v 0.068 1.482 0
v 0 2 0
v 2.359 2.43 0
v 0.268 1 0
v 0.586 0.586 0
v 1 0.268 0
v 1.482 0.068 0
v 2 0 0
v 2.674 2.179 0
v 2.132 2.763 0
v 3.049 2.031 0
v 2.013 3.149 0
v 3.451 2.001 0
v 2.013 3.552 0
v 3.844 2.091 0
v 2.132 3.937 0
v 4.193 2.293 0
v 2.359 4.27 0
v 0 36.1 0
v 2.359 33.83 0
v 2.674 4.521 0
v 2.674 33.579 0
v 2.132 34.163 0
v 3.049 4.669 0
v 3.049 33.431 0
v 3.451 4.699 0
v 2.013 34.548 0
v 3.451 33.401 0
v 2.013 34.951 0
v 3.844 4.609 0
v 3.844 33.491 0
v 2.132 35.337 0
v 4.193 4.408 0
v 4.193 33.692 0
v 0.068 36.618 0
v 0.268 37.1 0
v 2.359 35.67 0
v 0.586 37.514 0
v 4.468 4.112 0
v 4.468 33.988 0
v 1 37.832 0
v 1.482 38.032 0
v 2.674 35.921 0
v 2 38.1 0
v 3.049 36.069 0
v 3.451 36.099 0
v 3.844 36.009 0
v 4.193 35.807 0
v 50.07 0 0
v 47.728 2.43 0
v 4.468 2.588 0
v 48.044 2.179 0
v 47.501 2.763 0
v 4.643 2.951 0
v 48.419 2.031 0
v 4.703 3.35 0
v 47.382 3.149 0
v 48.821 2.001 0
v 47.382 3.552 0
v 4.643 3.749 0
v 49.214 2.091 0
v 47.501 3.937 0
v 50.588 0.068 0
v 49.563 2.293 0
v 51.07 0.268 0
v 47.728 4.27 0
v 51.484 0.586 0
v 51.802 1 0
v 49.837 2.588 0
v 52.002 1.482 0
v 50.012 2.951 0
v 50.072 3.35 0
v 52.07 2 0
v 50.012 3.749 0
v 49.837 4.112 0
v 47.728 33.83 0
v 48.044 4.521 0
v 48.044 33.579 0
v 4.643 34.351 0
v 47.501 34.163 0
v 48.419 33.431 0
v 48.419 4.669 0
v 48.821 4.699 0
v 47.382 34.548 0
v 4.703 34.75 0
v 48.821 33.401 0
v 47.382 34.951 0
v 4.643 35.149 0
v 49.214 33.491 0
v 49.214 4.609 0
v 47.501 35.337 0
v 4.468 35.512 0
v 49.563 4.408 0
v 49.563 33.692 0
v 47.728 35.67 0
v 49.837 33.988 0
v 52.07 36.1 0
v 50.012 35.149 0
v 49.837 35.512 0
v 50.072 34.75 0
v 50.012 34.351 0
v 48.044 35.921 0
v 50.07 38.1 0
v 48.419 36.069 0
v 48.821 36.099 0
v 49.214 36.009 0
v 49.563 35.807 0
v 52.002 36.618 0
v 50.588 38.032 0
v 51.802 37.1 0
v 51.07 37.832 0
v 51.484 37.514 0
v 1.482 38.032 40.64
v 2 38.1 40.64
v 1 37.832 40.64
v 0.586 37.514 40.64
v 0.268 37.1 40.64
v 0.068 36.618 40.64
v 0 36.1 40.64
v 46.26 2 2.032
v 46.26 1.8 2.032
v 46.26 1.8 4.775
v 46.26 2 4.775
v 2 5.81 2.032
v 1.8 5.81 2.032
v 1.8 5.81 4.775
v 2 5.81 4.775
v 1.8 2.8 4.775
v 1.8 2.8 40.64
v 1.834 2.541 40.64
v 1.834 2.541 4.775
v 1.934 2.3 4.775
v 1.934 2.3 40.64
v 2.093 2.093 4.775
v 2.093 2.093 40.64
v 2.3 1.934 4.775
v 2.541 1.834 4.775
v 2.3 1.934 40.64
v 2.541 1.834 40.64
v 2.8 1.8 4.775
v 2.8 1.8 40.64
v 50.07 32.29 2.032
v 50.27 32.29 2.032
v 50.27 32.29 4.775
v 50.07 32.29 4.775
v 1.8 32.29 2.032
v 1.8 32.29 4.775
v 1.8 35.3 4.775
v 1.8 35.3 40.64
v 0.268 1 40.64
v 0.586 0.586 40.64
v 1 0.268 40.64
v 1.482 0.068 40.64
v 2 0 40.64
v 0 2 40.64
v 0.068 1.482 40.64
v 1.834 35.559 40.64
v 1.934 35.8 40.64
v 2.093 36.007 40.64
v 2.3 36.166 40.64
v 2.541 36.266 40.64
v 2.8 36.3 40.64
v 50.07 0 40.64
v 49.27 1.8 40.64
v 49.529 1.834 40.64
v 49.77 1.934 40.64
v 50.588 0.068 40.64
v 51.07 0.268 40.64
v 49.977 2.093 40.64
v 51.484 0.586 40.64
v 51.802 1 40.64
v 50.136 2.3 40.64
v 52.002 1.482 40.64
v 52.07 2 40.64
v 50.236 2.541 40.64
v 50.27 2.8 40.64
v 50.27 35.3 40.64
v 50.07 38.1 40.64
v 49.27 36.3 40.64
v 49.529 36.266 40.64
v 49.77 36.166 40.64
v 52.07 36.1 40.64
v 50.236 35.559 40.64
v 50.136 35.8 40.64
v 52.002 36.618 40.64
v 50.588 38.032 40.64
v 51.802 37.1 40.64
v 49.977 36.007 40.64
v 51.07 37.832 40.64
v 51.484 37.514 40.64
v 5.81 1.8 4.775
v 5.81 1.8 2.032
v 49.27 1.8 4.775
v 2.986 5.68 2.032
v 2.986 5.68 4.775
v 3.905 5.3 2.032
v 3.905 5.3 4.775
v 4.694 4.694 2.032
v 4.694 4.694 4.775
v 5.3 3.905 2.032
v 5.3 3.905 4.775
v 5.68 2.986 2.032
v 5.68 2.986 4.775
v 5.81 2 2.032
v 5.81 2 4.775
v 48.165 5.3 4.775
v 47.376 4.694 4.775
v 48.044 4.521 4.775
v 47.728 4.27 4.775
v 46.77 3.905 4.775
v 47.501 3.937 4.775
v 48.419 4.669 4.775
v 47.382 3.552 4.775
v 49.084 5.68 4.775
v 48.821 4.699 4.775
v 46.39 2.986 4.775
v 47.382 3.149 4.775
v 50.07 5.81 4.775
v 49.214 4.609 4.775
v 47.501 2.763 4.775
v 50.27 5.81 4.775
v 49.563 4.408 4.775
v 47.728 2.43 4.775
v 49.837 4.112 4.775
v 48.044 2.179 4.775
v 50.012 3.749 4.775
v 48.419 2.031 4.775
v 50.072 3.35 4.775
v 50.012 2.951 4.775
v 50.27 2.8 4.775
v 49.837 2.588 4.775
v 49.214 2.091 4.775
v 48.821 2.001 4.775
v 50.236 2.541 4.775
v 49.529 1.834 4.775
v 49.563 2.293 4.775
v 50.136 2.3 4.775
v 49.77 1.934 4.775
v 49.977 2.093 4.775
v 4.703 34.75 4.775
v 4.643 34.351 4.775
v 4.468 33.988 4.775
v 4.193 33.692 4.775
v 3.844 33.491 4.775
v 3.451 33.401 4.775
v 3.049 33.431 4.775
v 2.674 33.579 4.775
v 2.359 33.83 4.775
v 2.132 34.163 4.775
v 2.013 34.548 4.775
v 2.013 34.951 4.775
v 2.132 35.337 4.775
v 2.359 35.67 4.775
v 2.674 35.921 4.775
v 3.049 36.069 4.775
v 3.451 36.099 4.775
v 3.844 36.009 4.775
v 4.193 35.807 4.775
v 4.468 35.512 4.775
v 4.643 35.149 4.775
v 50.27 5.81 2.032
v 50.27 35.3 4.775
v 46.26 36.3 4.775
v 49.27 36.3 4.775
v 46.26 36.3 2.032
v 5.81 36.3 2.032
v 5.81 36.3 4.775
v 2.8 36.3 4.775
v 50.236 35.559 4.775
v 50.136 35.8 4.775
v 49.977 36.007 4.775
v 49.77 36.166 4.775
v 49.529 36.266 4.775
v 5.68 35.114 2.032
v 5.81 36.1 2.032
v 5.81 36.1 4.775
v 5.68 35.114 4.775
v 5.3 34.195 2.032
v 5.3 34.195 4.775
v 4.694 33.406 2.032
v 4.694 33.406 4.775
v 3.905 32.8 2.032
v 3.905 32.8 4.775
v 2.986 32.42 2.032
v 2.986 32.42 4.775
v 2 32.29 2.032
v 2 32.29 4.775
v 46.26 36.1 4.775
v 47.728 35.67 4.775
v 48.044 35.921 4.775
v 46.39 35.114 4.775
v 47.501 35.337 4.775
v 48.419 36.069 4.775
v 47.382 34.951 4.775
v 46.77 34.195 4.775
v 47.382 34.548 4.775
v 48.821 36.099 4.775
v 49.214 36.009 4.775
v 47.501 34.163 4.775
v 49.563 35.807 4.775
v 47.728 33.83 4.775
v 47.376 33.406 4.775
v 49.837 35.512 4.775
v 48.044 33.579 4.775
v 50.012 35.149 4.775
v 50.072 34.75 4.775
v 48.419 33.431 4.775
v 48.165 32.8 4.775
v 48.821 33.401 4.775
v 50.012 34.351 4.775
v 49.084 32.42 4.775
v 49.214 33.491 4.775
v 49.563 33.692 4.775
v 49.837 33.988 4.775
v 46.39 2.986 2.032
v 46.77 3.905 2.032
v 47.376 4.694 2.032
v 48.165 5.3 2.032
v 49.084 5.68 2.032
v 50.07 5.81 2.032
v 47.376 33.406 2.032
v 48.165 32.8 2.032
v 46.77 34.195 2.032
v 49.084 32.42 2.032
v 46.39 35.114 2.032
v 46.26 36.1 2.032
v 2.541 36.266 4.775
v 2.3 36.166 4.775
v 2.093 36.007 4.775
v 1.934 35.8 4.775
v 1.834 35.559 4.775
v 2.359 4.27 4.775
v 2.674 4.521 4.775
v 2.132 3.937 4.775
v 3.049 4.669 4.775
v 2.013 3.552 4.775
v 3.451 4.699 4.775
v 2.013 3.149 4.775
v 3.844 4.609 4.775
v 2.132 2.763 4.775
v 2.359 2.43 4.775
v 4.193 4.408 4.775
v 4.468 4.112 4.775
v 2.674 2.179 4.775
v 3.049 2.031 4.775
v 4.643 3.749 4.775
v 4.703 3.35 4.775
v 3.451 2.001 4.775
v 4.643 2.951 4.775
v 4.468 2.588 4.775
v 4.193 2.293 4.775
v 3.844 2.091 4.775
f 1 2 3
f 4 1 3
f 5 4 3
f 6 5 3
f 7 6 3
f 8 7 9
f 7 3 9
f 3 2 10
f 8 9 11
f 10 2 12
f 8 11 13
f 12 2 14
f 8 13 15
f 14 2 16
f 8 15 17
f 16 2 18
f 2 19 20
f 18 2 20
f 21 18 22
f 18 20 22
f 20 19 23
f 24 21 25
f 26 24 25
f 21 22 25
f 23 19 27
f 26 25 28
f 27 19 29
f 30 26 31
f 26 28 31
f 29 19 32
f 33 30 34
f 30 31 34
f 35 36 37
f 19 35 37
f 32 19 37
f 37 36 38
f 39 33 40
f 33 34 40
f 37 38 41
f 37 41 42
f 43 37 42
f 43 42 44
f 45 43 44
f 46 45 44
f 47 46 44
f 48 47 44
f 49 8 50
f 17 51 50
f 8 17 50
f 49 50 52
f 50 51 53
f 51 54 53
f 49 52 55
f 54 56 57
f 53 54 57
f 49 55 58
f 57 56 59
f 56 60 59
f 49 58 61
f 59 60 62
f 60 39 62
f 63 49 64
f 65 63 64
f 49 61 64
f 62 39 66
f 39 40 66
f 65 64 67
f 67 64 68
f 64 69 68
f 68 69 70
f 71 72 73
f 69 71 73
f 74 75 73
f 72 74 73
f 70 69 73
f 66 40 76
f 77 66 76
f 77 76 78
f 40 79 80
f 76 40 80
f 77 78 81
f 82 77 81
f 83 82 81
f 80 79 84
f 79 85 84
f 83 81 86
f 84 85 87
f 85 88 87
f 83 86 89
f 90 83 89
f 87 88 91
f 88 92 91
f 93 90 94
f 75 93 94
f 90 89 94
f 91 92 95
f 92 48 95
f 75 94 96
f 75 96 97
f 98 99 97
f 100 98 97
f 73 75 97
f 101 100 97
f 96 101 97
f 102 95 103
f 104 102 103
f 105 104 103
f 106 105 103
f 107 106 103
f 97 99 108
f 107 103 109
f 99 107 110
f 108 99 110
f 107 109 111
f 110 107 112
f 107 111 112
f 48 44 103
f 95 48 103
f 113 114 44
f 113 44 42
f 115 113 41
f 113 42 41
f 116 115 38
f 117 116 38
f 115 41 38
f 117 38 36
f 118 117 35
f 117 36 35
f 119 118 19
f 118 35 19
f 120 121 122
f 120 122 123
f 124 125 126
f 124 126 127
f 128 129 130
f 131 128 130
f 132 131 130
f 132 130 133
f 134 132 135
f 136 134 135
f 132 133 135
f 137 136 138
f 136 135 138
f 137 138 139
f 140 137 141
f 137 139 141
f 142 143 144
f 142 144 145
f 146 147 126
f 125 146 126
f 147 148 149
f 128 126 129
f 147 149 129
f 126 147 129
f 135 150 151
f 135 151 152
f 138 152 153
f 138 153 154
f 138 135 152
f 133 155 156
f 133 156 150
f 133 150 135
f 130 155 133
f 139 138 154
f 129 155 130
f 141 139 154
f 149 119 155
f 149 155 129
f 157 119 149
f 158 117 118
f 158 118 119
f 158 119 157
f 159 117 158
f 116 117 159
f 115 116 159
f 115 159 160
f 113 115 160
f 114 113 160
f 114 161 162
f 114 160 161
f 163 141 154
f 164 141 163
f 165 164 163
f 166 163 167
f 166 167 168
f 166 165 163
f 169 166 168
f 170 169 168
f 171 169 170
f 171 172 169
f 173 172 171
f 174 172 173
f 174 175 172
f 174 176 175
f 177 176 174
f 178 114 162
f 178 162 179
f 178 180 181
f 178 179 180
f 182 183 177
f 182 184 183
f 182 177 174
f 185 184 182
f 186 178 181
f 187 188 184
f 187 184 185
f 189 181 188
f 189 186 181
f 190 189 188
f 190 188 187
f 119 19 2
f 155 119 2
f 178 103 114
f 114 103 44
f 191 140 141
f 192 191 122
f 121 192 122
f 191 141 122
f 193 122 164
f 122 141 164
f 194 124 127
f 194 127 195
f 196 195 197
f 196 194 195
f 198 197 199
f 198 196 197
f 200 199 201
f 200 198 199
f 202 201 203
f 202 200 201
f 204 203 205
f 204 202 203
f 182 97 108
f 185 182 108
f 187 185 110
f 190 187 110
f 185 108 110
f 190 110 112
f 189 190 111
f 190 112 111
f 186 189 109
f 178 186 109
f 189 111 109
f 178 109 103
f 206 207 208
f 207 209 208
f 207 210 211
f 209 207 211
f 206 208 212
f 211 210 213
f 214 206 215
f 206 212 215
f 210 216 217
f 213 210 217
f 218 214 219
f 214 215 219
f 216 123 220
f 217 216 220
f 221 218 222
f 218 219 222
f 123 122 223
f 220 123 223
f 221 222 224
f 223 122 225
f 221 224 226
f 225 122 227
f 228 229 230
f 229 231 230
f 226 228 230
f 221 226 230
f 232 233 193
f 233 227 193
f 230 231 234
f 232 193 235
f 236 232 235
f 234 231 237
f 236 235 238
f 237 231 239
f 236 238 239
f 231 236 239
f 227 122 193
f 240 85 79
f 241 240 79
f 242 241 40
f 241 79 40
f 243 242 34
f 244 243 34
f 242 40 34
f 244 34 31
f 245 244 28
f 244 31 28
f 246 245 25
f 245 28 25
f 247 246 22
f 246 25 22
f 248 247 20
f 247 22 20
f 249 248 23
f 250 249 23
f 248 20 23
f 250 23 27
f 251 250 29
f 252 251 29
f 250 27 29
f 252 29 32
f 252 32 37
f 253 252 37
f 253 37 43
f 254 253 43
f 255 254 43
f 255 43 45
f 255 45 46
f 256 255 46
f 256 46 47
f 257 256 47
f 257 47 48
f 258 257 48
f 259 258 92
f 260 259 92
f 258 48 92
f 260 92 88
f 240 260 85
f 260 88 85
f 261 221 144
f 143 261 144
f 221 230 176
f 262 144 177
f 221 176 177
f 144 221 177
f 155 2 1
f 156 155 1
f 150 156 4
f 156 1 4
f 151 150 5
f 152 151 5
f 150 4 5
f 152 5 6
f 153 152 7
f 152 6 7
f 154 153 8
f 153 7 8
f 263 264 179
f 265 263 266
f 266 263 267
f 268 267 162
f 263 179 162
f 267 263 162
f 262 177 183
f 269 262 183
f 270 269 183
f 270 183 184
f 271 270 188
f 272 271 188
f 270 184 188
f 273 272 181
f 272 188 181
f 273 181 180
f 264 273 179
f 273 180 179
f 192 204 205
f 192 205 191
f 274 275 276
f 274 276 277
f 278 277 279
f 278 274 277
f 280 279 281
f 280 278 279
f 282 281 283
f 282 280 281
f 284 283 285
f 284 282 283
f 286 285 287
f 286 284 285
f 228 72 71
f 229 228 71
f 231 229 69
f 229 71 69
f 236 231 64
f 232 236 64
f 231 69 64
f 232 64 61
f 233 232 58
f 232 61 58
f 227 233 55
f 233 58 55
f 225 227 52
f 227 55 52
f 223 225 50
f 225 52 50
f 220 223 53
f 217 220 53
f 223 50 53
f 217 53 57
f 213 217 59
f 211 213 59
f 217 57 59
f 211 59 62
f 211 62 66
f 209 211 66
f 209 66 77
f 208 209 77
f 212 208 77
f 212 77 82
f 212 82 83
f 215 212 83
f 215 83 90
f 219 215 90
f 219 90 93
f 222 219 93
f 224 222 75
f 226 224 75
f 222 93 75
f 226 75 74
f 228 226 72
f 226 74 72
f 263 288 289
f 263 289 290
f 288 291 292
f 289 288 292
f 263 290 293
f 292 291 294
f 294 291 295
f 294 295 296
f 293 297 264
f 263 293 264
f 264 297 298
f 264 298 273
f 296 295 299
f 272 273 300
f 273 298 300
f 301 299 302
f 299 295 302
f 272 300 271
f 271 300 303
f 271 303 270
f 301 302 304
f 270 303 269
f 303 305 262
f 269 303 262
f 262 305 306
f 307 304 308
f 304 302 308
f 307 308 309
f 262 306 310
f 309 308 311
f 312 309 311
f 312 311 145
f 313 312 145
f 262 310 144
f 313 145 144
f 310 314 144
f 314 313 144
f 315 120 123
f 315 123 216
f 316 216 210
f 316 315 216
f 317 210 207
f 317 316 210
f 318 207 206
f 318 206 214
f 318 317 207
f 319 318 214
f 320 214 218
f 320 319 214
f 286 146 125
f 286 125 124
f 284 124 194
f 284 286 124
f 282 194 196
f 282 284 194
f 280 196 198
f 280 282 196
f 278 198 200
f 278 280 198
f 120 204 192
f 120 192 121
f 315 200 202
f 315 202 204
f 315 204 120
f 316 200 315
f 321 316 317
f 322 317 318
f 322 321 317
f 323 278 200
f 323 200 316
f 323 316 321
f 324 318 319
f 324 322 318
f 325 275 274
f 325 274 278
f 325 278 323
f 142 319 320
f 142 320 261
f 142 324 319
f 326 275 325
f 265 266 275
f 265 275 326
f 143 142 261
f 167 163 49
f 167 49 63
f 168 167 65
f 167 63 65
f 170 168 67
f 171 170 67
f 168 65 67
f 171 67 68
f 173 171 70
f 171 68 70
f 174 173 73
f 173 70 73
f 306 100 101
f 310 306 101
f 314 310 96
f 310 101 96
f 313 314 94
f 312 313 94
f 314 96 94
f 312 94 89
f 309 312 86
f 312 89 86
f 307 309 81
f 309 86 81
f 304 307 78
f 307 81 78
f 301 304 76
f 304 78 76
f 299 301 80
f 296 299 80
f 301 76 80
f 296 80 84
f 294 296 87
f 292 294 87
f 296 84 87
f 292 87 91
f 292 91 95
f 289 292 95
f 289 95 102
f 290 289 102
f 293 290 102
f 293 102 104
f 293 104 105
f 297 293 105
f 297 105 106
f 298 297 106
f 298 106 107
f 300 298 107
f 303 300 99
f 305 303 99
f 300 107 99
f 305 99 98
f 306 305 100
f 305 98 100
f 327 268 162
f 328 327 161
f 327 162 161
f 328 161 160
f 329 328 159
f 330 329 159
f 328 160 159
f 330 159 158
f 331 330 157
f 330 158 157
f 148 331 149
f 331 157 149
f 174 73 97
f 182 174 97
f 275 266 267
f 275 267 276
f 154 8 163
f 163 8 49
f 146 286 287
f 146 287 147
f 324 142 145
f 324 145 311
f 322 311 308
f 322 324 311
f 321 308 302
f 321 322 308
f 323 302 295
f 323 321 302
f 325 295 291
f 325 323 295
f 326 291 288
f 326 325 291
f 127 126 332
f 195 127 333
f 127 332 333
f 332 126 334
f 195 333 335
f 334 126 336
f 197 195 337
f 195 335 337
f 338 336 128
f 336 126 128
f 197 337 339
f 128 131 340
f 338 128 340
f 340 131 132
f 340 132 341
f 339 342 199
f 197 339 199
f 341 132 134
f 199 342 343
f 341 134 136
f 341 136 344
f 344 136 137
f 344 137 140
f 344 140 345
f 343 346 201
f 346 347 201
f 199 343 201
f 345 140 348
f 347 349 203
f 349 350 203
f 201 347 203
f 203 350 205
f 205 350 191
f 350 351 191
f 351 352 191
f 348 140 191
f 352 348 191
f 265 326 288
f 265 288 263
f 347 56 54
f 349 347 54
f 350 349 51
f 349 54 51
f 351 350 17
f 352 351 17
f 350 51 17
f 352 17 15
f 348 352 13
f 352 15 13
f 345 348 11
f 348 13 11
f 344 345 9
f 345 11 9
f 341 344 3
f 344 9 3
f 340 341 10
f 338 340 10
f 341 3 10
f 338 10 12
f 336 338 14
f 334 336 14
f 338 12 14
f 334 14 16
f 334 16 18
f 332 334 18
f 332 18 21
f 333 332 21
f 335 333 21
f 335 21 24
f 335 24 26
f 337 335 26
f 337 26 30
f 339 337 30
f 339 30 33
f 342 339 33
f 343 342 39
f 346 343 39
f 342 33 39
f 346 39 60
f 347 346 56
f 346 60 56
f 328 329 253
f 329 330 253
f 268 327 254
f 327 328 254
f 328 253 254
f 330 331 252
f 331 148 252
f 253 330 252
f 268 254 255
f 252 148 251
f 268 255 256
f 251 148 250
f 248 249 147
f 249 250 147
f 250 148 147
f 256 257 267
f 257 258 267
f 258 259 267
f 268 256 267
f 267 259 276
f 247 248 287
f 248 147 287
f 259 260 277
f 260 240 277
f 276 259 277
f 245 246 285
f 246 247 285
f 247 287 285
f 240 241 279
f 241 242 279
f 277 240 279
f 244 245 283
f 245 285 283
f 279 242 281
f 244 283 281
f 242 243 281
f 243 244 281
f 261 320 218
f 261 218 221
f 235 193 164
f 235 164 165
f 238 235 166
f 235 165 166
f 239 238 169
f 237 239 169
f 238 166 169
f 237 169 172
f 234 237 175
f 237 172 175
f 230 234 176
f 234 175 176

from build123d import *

# Parameters (mm, degrees)
F1_DEPTH = 40.64
F3_DEPTH = 38.608
F5_DEPTH = 4.7752
F6_R     = 1.35255
F7_DEPTH = 4.7752


# Not quite as in the source:
# - a feature names something its author has since deleted; it is built from what else it names


with BuildPart() as f1:
    # F0 (on Top) → F1 (new body)
    with BuildSketch(Plane.XY):
        with BuildLine():
            ThreePointArc((0, 2), (0.5857864376, 0.5857864376), (2, 0))
            Line((2, 0), (50.07, 0))
            ThreePointArc((50.07, 0), (51.4842135624, 0.5857864376), (52.07, 2))
            Line((52.07, 2), (52.07, 36.1))
            ThreePointArc((52.07, 36.1), (51.4842135624, 37.5142135624), (50.07, 38.1))
            Line((50.07, 38.1), (2, 38.1))
            ThreePointArc((2, 38.1), (0.5857864376, 37.5142135624), (0, 36.1))
            Line((0, 36.1), (0, 2))
        make_face()
    extrude(amount=F1_DEPTH)

    # F2 (on face) → F3 (cut)
    with BuildSketch(Plane.XY.offset(40.64)):
        with BuildLine():
            Line((49.27, 36.3), (2.8, 36.3))
            ThreePointArc((2.8, 36.3), (2.0928932188, 36.0071067812), (1.8, 35.3))
            Line((1.8, 35.3), (1.8, 2.8))
            ThreePointArc((1.8, 2.8), (2.0928932188, 2.0928932188), (2.8, 1.8))
            Line((2.8, 1.8), (49.27, 1.8))
            ThreePointArc((49.27, 1.8), (49.9771067812, 2.0928932188), (50.27, 2.8))
            Line((50.27, 2.8), (50.27, 35.3))
            ThreePointArc((50.27, 35.3), (49.9771067812, 36.0071067812), (49.27, 36.3))
        make_face()
    extrude(amount=-F3_DEPTH, mode=Mode.SUBTRACT)

    # F4 (on face) → F5 (join)
    with BuildSketch(Plane(origin=(0, 0, 0), x_dir=(1, 0, 0), z_dir=(0, 0, -1))):
        with BuildLine():
            ThreePointArc((52.07, -2), (51.4842135624, -0.5857864376), (50.07, 0))
            Line((50.07, 0), (46.26, 0))
            Line((46.26, 0), (46.26, -2))
            ThreePointArc((46.26, -2), (47.3759231637, -4.6940768363), (50.07, -5.81))
            Line((50.07, -5.81), (52.07, -5.81))
            Line((52.07, -5.81), (52.07, -2))
        make_face()
        with BuildLine():
            Line((46.26, -36.1), (46.26, -38.1))
            Line((46.26, -38.1), (50.07, -38.1))
            ThreePointArc((50.07, -38.1), (51.4842135624, -37.5142135624), (52.07, -36.1))
            Line((52.07, -36.1), (52.07, -32.29))
            Line((52.07, -32.29), (50.07, -32.29))
            ThreePointArc((50.07, -32.29), (47.3759231637, -33.4059231637), (46.26, -36.1))
        make_face()
        with BuildLine():
            ThreePointArc((5.81, -36.1), (4.6940768363, -33.4059231637), (2, -32.29))
            Line((2, -32.29), (0, -32.29))
            Line((0, -32.29), (0, -36.1))
            ThreePointArc((0, -36.1), (0.5857864376, -37.5142135624), (2, -38.1))
            Line((2, -38.1), (5.81, -38.1))
            Line((5.81, -38.1), (5.81, -36.1))
        make_face()
        with BuildLine():
            Line((5.81, 0), (2, 0))
            ThreePointArc((2, 0), (0.5857864376, -0.5857864376), (0, -2))
            Line((0, -2), (0, -5.81))
            Line((0, -5.81), (2, -5.81))
            ThreePointArc((2, -5.81), (4.6940768363, -4.6940768363), (5.81, -2))
            Line((5.81, -2), (5.81, 0))
        make_face()
    extrude(amount=-F5_DEPTH)

    # F6 (on face) → F7 (cut, through all)
    with BuildSketch(Plane(origin=(0, 0, 0), x_dir=(1, 0, 0), z_dir=(0, 0, -1))):
        with Locations((48.7198709242, -3.3501290758)):
            Circle(F6_R)
        with Locations((3.3501290758, -3.3501290758)):
            Circle(F6_R)
        with Locations((3.3501290758, -34.7498709242)):
            Circle(F6_R)
        with Locations((48.7198709242, -34.7498709242)):
            Circle(F6_R)
    extrude(amount=-F7_DEPTH, mode=Mode.SUBTRACT)


solid = f1.part
